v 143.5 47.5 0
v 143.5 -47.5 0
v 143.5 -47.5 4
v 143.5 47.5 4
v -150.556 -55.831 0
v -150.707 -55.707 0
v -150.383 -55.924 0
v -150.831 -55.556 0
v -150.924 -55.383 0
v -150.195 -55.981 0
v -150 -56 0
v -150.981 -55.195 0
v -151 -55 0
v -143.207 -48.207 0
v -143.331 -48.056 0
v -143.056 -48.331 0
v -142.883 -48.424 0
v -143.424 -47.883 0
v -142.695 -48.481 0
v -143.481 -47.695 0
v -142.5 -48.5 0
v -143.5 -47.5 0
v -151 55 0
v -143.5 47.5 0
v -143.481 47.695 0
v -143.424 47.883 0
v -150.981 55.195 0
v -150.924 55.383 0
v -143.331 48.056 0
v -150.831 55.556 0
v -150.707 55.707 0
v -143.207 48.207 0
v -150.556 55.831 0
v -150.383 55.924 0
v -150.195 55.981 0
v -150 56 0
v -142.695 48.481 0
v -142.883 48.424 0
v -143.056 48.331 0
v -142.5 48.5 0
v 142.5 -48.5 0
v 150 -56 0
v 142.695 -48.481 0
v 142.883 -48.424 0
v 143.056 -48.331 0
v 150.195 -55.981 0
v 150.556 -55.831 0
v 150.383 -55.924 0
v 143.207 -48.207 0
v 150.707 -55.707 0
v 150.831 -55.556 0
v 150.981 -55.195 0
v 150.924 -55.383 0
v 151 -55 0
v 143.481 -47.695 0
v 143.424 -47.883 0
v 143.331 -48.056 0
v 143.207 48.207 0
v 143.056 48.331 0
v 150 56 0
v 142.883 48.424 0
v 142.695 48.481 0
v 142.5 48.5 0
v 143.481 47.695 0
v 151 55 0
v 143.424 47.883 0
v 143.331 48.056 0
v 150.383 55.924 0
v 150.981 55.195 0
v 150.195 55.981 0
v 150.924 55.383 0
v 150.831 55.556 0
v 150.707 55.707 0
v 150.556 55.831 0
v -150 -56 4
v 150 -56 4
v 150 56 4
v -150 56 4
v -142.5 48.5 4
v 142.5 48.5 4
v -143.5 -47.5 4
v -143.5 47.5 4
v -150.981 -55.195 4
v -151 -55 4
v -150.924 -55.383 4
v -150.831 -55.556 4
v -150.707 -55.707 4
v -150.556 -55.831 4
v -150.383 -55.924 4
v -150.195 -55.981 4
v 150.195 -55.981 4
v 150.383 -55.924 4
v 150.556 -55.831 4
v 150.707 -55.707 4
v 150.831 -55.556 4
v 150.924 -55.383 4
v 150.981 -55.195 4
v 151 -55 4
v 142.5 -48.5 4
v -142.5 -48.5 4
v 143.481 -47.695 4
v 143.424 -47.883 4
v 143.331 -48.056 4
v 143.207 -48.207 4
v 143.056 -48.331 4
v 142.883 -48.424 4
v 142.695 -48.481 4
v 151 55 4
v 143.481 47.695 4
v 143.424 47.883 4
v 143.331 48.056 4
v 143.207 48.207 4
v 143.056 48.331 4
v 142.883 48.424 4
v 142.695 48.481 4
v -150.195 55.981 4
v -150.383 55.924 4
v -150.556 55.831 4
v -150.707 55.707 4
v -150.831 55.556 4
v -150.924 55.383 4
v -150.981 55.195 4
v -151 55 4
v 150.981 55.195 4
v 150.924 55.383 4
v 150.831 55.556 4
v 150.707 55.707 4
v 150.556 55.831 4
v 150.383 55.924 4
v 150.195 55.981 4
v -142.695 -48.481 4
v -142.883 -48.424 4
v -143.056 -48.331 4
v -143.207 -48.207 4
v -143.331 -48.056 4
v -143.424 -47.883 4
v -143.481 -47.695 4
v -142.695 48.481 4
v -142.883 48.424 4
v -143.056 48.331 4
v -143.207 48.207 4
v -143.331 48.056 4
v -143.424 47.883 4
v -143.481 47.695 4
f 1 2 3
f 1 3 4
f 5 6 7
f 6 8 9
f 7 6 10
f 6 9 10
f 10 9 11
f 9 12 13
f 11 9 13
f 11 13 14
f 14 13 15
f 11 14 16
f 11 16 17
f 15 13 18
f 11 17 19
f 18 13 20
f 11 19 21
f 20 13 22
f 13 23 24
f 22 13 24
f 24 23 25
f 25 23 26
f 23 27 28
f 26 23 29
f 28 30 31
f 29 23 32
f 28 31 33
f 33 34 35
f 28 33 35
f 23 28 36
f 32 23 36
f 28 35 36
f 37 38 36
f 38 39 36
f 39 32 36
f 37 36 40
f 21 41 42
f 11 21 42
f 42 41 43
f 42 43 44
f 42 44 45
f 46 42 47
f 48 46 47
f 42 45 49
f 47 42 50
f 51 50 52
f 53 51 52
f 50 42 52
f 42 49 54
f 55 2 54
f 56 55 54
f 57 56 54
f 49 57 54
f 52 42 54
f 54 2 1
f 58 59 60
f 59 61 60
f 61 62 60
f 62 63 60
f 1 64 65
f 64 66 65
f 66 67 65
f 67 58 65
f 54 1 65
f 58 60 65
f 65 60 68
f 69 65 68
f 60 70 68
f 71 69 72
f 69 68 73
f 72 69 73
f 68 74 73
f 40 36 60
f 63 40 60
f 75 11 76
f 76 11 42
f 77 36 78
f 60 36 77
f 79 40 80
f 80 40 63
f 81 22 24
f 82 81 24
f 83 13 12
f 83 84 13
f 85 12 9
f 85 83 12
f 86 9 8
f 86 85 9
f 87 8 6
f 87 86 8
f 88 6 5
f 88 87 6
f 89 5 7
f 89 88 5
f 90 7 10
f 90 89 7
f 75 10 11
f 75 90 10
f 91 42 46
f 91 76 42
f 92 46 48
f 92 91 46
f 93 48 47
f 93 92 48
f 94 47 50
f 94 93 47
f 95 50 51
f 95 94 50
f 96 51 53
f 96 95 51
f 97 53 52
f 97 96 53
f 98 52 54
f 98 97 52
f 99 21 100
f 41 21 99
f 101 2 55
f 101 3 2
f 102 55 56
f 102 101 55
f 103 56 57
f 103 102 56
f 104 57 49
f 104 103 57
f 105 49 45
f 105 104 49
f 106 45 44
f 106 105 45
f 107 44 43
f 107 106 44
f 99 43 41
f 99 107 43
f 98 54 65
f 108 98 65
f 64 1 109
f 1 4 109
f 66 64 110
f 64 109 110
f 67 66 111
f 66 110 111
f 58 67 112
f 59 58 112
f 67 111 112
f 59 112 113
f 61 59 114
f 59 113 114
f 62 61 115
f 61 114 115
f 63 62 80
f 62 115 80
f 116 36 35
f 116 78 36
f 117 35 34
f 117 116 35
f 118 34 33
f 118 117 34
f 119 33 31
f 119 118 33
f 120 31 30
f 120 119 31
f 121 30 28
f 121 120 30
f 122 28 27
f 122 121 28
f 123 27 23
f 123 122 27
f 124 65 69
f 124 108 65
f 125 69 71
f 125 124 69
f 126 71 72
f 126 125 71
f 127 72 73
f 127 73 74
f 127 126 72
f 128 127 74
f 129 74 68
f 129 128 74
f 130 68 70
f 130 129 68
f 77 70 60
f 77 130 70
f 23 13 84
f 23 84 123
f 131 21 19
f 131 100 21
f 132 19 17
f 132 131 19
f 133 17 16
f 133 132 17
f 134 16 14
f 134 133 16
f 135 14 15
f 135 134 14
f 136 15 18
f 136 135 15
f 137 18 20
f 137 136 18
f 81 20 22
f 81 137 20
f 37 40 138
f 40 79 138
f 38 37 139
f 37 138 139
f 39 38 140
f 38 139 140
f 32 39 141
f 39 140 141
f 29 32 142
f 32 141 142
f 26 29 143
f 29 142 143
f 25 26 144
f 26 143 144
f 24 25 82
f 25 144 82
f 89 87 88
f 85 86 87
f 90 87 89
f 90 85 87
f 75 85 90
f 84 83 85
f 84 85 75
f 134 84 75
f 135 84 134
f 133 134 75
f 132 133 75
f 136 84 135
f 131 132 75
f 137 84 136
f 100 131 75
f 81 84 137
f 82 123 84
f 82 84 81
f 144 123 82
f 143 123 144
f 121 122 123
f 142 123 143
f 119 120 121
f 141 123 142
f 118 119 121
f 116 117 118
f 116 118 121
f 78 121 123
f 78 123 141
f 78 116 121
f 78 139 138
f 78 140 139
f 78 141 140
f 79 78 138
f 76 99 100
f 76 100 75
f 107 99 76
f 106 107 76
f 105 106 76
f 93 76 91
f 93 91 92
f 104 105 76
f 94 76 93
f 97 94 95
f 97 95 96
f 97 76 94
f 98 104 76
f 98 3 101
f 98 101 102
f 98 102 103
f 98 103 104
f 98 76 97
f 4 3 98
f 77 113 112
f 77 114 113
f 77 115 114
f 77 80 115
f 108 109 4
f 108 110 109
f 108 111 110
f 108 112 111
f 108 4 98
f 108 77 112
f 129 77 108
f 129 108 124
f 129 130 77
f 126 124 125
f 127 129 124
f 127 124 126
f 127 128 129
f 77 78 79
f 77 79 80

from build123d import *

# Parameters (mm, degrees)
SKETCH_W    = 302
SKETCH_H    = 112
SKETCH_W_2  = 287
SKETCH_H_2  = 97
PAD_DEPTH   = 4
FILLET_R    = 1
FILLET001_R = 1
FILLET002_R = 1
FILLET003_R = 1
FILLET004_R = 1
FILLET005_R = 1
FILLET006_R = 1
FILLET007_R = 1


with BuildPart() as part:
    # Sketch → Pad (new body)
    with BuildSketch(Plane.XY):
        Rectangle(SKETCH_W, SKETCH_H)
        Rectangle(SKETCH_W_2, SKETCH_H_2, mode=Mode.SUBTRACT)
    extrude(amount=PAD_DEPTH)

    # Fillet
    fillet_edges = [part.edges().sort_by_distance(p)[0] for p in [
        (-151, -56, 2),
    ]]
    fillet(fillet_edges, radius=FILLET_R)

    # Fillet001
    fillet001_edges = [part.edges().sort_by_distance(p)[0] for p in [
        (151, -56, 2),
    ]]
    fillet(fillet001_edges, radius=FILLET001_R)

    # Fillet002
    fillet002_edges = [part.edges().sort_by_distance(p)[0] for p in [
        (-143.5, 48.5, 2),
    ]]
    fillet(fillet002_edges, radius=FILLET002_R)

    # Fillet003
    fillet003_edges = [part.edges().sort_by_distance(p)[0] for p in [
        (151, 56, 2),
    ]]
    fillet(fillet003_edges, radius=FILLET003_R)

    # Fillet004
    fillet004_edges = [part.edges().sort_by_distance(p)[0] for p in [
        (-151, 56, 2),
    ]]
    fillet(fillet004_edges, radius=FILLET004_R)

    # Fillet005
    fillet005_edges = [part.edges().sort_by_distance(p)[0] for p in [
        (143.5, -48.5, 2),
    ]]
    fillet(fillet005_edges, radius=FILLET005_R)

    # Fillet006
    fillet006_edges = [part.edges().sort_by_distance(p)[0] for p in [
        (143.5, 48.5, 2),
    ]]
    fillet(fillet006_edges, radius=FILLET006_R)

    # Fillet007
    fillet007_edges = [part.edges().sort_by_distance(p)[0] for p in [
        (-143.5, -48.5, 2),
    ]]
    fillet(fillet007_edges, radius=FILLET007_R)


solid = part.part
